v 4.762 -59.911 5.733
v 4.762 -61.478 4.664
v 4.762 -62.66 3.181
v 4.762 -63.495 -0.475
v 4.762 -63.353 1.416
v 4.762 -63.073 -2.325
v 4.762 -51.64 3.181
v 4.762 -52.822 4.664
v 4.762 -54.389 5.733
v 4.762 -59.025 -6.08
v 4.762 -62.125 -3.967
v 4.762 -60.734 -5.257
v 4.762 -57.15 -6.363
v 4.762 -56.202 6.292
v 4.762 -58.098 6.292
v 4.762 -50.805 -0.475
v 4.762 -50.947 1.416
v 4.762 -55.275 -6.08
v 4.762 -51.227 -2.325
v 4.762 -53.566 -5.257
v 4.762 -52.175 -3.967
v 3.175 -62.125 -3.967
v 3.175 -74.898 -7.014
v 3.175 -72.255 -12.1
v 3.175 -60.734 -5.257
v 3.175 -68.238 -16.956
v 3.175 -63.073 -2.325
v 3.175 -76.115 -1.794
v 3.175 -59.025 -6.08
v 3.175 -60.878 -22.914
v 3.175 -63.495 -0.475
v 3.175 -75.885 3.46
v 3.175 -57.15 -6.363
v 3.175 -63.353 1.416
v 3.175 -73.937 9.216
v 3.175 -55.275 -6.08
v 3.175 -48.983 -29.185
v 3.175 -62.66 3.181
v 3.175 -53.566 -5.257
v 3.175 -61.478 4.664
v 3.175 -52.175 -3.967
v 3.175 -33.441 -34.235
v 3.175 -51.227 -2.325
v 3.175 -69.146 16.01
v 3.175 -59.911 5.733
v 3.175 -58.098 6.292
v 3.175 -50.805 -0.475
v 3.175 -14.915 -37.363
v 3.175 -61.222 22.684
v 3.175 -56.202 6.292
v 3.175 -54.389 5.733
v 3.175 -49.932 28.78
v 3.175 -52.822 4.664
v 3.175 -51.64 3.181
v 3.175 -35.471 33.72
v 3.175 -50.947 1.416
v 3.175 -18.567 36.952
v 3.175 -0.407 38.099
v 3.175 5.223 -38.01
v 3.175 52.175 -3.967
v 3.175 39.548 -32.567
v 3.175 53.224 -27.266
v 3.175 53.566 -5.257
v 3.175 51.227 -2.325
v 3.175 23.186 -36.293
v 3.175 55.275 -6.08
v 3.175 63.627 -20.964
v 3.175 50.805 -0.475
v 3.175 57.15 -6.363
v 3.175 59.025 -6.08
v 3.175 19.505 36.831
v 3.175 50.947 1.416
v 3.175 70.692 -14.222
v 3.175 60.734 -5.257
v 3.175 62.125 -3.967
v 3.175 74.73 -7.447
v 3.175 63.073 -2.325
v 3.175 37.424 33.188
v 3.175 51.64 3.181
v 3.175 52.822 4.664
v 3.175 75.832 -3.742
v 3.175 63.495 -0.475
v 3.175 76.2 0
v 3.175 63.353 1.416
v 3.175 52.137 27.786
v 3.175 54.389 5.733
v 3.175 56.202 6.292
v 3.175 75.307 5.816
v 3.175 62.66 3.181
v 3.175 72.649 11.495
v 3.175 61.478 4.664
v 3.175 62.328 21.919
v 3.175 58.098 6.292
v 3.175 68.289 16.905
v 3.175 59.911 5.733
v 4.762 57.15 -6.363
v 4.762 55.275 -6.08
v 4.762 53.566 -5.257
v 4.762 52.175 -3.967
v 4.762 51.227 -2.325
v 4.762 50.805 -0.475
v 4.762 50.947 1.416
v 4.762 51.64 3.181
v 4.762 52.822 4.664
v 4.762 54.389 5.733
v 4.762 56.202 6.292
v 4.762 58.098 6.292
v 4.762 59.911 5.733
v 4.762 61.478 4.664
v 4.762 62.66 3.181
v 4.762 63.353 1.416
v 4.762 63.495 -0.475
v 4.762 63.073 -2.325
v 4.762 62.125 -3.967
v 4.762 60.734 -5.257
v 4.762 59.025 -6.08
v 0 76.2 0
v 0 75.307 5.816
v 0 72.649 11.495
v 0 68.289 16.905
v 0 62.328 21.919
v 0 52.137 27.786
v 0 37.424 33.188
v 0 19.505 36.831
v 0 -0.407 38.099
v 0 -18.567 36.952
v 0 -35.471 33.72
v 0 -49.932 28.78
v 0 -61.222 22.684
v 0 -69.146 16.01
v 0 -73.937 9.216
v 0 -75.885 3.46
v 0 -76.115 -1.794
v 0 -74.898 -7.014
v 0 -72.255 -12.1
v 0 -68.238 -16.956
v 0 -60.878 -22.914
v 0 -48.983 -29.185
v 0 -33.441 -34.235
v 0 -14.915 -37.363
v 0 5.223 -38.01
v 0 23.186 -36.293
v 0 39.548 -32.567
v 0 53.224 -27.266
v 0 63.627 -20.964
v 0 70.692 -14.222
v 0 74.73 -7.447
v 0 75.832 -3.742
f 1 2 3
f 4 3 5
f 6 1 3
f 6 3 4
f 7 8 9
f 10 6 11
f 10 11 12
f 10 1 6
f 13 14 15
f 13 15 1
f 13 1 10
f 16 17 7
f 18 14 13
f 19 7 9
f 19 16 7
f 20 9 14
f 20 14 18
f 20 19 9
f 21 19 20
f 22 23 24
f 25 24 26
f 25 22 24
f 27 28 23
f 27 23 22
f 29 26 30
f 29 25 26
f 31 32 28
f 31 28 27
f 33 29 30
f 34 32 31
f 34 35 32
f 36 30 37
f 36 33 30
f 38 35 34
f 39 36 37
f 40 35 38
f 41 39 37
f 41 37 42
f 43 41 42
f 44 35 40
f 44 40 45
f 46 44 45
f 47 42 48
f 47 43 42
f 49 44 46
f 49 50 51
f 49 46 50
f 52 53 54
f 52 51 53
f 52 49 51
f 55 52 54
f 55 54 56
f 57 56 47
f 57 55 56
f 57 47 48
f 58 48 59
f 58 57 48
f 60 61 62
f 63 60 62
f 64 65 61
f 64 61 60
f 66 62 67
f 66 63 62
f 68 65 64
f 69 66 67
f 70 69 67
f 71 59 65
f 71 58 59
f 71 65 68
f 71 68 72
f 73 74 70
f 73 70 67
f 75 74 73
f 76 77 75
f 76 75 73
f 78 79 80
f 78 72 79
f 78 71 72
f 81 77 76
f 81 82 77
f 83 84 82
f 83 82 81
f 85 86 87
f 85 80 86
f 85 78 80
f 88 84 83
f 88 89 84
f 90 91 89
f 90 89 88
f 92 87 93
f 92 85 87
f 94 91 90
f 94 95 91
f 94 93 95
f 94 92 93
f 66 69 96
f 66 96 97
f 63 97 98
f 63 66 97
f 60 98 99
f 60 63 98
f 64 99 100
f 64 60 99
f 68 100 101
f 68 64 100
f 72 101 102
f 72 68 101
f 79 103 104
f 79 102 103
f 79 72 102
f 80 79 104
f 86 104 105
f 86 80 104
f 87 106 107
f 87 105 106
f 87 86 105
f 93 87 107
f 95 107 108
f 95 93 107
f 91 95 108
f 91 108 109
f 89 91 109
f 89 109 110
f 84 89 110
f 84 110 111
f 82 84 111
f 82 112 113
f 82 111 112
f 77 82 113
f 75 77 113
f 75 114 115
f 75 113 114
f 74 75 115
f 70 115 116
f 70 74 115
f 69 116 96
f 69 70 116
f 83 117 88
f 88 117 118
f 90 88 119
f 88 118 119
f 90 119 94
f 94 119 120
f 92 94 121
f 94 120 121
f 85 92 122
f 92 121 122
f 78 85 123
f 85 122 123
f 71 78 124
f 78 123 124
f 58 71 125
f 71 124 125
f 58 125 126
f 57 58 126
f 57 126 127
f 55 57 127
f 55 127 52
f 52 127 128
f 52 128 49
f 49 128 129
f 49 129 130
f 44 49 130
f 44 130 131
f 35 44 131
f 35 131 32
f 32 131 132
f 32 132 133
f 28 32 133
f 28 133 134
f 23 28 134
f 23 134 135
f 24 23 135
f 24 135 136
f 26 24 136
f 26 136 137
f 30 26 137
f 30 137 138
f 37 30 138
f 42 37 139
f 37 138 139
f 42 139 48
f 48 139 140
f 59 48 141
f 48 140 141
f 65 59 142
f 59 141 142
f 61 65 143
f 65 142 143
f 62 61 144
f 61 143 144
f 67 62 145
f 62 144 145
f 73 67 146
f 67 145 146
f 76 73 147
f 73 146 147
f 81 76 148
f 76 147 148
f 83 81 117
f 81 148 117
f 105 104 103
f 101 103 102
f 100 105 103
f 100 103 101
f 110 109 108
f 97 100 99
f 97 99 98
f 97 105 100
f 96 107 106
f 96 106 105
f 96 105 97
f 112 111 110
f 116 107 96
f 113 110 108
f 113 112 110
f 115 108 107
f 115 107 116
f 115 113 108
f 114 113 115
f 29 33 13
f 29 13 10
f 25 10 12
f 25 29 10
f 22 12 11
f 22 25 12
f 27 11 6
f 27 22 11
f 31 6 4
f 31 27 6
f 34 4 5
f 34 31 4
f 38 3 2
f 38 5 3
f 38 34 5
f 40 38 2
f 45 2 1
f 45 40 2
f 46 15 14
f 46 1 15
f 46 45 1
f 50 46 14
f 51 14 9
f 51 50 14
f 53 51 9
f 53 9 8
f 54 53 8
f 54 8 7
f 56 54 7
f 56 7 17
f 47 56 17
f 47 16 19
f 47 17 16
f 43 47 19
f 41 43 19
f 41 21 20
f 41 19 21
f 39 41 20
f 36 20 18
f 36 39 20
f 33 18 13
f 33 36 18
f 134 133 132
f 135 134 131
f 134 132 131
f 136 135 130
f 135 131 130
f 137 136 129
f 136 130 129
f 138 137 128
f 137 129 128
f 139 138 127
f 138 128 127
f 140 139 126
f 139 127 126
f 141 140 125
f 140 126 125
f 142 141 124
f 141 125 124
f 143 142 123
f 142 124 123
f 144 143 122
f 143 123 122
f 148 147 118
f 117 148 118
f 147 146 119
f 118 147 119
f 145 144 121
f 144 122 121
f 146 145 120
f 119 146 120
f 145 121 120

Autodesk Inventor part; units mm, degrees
ref_plane "YZ Plane" through (0, 0, 0) normal (1, 0, 0) x (0, 1, 0)
ref_plane "XZ Plane" through (0, 0, 0) normal (0, 1, 0) x (-1, 0, 0)
ref_plane "XY Plane" through (0, 0, 0) normal (0, 0, 1) x (1, 0, 0)
sketch "Sketch1" plane through (0, 0, 0) normal (1, 0, 0) x (0, 1, 0)
  ellipse E0 centre (0, 0) end of major axis (76.2, 0) minor radius 38.1
  dimension "d0" = 38.1
  dimension "d1" = 76.2
extrude "Extrusion1" add sketch "Sketch1" along normal blind 3.175
sketch "Sketch2" plane through (3.175, 0, 0) normal (1, 0, 0) x (0, 0, -1)
  ellipse E0 centre (0, 0) end of major axis (0, -76.2) minor radius 38.1 projected
  circle A0 centre (0, 57.15) radius 6.3627
  circle A1 centre (0, -57.15) radius 6.3627
  dimension "d4" = 57.15
  dimension "d5" = 57.15
  dimension "d6" = 12.7254
  dimension "d7" = 12.7254
extrude "Extrusion2" add sketch "Sketch2" along normal blind 1.5875 contours A0 | A1
equation "\"d7\" = d6"
properties part number "belt for lift"
